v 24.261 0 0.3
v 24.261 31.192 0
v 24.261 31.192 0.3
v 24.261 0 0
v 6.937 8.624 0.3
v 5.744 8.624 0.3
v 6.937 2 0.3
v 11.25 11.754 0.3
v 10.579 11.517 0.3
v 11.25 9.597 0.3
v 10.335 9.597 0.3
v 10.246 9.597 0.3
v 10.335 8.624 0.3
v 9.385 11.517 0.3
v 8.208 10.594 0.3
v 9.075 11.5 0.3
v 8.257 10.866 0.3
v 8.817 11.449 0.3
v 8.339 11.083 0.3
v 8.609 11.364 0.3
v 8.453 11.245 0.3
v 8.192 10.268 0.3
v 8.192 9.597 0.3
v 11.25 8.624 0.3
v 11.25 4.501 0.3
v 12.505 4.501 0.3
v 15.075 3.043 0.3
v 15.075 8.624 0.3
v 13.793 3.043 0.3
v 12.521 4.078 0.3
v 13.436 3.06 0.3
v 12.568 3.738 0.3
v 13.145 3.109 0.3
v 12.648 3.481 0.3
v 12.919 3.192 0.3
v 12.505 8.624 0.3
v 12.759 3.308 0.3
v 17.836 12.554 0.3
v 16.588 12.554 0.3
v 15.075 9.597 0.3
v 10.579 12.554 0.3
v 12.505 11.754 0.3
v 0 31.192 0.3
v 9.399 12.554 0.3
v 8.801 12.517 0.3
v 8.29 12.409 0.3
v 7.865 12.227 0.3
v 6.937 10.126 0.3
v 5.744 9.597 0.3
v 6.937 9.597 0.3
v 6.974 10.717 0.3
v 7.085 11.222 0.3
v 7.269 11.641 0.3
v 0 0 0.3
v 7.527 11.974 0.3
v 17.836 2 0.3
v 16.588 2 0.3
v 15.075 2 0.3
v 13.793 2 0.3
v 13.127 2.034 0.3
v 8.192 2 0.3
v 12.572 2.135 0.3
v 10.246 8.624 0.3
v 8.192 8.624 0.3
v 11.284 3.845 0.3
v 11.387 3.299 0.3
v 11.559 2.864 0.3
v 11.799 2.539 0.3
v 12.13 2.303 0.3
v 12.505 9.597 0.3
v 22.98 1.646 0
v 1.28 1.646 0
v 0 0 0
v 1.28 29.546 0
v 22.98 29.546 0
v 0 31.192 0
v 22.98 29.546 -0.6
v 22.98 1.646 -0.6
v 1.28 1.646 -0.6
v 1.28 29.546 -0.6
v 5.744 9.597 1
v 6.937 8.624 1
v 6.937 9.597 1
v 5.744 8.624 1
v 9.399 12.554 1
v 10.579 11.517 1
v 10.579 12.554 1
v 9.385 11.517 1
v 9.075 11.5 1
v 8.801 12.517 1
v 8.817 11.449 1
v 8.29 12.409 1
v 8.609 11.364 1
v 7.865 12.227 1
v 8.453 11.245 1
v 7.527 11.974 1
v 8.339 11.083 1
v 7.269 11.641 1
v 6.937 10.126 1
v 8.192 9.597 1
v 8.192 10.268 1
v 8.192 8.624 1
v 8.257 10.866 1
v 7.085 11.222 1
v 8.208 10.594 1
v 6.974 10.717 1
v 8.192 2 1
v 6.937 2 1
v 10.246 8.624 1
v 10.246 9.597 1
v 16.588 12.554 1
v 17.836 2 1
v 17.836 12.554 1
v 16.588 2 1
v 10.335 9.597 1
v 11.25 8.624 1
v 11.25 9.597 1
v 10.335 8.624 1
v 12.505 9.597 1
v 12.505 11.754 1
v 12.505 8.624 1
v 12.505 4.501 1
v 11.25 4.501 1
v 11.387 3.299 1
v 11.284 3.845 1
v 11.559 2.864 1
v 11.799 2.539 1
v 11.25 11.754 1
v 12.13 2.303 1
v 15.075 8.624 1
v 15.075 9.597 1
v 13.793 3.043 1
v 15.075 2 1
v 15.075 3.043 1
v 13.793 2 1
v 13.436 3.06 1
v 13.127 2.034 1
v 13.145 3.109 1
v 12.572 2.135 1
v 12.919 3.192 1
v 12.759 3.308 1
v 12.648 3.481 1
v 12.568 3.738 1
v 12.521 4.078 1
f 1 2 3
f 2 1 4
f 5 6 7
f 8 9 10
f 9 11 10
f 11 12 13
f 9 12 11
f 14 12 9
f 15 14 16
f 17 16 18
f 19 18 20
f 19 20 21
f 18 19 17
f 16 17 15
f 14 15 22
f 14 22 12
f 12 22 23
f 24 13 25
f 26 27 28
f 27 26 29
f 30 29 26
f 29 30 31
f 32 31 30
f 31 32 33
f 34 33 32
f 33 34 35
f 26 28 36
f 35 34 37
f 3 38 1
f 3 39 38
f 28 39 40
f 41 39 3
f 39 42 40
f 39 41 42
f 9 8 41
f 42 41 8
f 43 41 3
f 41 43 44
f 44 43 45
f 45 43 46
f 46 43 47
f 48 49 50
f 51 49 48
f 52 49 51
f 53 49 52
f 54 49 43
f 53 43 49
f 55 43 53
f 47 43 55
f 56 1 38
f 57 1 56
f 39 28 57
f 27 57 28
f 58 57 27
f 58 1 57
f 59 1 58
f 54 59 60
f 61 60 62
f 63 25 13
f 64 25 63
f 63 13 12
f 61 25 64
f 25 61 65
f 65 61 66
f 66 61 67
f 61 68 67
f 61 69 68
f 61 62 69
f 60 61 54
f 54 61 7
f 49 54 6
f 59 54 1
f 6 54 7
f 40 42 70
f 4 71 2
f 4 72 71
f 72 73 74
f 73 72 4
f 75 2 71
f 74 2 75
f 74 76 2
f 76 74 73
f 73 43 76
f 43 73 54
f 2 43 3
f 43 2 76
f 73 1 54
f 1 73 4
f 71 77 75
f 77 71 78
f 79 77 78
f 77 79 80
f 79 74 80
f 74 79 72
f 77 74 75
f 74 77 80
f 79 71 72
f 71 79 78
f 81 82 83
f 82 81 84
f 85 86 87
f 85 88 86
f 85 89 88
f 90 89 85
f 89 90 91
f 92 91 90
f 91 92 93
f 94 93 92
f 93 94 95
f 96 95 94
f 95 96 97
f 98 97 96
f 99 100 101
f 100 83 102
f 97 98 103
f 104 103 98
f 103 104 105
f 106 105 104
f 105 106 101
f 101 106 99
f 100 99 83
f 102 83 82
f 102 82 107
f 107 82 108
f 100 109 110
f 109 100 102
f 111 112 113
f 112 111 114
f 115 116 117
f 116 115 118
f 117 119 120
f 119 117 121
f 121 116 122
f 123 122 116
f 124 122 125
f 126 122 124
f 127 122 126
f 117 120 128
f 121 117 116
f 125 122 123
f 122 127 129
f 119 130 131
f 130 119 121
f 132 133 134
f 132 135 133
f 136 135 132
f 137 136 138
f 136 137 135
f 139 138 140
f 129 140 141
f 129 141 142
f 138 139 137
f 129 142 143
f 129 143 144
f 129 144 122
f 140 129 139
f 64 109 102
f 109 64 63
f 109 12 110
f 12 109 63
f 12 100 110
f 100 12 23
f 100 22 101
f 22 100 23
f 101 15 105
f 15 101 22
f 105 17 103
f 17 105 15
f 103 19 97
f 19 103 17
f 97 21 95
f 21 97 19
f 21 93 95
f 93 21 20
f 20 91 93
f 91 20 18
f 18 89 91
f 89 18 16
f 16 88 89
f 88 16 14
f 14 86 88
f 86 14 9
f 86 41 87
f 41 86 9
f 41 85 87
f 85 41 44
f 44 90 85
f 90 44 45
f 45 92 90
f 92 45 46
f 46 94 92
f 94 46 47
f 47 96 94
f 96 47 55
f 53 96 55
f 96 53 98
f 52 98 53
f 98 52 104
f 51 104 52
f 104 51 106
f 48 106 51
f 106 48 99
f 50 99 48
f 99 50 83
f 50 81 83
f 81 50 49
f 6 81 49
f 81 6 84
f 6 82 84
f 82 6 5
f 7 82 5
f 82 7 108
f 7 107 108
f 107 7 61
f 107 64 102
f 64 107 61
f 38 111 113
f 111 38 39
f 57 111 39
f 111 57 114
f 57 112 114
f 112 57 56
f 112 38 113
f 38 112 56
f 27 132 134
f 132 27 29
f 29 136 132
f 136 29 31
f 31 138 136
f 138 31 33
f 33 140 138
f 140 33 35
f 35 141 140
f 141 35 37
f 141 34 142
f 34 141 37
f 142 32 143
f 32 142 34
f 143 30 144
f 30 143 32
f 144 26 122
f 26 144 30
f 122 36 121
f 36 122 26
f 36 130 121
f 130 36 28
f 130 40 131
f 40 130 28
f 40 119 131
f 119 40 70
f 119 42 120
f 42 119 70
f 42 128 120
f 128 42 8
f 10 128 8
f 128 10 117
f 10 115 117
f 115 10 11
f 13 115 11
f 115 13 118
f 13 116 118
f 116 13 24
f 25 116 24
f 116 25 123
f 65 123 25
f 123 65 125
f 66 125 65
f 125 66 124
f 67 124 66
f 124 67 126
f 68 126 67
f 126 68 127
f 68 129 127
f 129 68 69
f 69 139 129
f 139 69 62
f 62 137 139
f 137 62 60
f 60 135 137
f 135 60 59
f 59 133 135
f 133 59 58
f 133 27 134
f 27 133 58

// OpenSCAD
//21.55x28.01
w=21.7;
h=27.9;
z=0.3;
rim=0.118;
text="ftl";
fontsize=10;

union() {
 cube([w*(1+rim),h*(1+rim),z]);
 translate([w*rim/2,h*rim/2,-0.6]){
  cube([w,h,z*2]);
 }    

}

// text
translate([w*0.25,2,0]) {
    linear_extrude(height = 1) {
      text(text, size = fontsize, font = "Verdana");
    }
}
